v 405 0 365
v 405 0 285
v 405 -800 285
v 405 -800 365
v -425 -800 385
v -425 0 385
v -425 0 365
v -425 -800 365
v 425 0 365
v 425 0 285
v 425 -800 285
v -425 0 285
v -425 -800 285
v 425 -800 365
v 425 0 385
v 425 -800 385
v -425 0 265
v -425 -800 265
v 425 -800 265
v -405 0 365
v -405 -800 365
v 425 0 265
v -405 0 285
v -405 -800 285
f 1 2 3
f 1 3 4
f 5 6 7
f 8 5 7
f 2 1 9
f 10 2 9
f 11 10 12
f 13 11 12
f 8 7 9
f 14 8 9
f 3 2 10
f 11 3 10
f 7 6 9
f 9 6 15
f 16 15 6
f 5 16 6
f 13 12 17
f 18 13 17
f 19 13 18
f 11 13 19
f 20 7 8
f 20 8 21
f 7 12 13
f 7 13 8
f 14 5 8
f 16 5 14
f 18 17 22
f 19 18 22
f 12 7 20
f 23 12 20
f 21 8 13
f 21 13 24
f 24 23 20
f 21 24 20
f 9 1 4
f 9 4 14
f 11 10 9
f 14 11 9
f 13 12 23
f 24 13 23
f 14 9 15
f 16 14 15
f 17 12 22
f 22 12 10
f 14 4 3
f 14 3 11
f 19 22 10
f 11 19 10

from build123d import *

# Parameters (mm, degrees)
F1_DEPTH = 800
F0_W     = 20
F0_H     = 80
F2_DEPTH = 800


with BuildPart() as f1:
    # F0 (on Front) → F1 (new body)
    with BuildSketch(Plane.XZ):
        Polygon((425, 385), (-425, 385), (-425, 365), (-405, 365), (405, 365), (425, 365), align=None)
        Polygon((-405, 285), (-425, 285), (-425, 265), (425, 265), (425, 285), (405, 285), align=None)
    extrude(amount=F1_DEPTH)


with BuildPart() as f2:
    # F0 (on Front) → F2 (new body)
    with BuildSketch(Plane.XZ):
        with Locations((415, 325)):
            Rectangle(F0_W, F0_H)
        with Locations((-415, 325)):
            Rectangle(F0_W, F0_H)
    extrude(amount=F2_DEPTH)


solid = Compound([f1.part, f2.part])
